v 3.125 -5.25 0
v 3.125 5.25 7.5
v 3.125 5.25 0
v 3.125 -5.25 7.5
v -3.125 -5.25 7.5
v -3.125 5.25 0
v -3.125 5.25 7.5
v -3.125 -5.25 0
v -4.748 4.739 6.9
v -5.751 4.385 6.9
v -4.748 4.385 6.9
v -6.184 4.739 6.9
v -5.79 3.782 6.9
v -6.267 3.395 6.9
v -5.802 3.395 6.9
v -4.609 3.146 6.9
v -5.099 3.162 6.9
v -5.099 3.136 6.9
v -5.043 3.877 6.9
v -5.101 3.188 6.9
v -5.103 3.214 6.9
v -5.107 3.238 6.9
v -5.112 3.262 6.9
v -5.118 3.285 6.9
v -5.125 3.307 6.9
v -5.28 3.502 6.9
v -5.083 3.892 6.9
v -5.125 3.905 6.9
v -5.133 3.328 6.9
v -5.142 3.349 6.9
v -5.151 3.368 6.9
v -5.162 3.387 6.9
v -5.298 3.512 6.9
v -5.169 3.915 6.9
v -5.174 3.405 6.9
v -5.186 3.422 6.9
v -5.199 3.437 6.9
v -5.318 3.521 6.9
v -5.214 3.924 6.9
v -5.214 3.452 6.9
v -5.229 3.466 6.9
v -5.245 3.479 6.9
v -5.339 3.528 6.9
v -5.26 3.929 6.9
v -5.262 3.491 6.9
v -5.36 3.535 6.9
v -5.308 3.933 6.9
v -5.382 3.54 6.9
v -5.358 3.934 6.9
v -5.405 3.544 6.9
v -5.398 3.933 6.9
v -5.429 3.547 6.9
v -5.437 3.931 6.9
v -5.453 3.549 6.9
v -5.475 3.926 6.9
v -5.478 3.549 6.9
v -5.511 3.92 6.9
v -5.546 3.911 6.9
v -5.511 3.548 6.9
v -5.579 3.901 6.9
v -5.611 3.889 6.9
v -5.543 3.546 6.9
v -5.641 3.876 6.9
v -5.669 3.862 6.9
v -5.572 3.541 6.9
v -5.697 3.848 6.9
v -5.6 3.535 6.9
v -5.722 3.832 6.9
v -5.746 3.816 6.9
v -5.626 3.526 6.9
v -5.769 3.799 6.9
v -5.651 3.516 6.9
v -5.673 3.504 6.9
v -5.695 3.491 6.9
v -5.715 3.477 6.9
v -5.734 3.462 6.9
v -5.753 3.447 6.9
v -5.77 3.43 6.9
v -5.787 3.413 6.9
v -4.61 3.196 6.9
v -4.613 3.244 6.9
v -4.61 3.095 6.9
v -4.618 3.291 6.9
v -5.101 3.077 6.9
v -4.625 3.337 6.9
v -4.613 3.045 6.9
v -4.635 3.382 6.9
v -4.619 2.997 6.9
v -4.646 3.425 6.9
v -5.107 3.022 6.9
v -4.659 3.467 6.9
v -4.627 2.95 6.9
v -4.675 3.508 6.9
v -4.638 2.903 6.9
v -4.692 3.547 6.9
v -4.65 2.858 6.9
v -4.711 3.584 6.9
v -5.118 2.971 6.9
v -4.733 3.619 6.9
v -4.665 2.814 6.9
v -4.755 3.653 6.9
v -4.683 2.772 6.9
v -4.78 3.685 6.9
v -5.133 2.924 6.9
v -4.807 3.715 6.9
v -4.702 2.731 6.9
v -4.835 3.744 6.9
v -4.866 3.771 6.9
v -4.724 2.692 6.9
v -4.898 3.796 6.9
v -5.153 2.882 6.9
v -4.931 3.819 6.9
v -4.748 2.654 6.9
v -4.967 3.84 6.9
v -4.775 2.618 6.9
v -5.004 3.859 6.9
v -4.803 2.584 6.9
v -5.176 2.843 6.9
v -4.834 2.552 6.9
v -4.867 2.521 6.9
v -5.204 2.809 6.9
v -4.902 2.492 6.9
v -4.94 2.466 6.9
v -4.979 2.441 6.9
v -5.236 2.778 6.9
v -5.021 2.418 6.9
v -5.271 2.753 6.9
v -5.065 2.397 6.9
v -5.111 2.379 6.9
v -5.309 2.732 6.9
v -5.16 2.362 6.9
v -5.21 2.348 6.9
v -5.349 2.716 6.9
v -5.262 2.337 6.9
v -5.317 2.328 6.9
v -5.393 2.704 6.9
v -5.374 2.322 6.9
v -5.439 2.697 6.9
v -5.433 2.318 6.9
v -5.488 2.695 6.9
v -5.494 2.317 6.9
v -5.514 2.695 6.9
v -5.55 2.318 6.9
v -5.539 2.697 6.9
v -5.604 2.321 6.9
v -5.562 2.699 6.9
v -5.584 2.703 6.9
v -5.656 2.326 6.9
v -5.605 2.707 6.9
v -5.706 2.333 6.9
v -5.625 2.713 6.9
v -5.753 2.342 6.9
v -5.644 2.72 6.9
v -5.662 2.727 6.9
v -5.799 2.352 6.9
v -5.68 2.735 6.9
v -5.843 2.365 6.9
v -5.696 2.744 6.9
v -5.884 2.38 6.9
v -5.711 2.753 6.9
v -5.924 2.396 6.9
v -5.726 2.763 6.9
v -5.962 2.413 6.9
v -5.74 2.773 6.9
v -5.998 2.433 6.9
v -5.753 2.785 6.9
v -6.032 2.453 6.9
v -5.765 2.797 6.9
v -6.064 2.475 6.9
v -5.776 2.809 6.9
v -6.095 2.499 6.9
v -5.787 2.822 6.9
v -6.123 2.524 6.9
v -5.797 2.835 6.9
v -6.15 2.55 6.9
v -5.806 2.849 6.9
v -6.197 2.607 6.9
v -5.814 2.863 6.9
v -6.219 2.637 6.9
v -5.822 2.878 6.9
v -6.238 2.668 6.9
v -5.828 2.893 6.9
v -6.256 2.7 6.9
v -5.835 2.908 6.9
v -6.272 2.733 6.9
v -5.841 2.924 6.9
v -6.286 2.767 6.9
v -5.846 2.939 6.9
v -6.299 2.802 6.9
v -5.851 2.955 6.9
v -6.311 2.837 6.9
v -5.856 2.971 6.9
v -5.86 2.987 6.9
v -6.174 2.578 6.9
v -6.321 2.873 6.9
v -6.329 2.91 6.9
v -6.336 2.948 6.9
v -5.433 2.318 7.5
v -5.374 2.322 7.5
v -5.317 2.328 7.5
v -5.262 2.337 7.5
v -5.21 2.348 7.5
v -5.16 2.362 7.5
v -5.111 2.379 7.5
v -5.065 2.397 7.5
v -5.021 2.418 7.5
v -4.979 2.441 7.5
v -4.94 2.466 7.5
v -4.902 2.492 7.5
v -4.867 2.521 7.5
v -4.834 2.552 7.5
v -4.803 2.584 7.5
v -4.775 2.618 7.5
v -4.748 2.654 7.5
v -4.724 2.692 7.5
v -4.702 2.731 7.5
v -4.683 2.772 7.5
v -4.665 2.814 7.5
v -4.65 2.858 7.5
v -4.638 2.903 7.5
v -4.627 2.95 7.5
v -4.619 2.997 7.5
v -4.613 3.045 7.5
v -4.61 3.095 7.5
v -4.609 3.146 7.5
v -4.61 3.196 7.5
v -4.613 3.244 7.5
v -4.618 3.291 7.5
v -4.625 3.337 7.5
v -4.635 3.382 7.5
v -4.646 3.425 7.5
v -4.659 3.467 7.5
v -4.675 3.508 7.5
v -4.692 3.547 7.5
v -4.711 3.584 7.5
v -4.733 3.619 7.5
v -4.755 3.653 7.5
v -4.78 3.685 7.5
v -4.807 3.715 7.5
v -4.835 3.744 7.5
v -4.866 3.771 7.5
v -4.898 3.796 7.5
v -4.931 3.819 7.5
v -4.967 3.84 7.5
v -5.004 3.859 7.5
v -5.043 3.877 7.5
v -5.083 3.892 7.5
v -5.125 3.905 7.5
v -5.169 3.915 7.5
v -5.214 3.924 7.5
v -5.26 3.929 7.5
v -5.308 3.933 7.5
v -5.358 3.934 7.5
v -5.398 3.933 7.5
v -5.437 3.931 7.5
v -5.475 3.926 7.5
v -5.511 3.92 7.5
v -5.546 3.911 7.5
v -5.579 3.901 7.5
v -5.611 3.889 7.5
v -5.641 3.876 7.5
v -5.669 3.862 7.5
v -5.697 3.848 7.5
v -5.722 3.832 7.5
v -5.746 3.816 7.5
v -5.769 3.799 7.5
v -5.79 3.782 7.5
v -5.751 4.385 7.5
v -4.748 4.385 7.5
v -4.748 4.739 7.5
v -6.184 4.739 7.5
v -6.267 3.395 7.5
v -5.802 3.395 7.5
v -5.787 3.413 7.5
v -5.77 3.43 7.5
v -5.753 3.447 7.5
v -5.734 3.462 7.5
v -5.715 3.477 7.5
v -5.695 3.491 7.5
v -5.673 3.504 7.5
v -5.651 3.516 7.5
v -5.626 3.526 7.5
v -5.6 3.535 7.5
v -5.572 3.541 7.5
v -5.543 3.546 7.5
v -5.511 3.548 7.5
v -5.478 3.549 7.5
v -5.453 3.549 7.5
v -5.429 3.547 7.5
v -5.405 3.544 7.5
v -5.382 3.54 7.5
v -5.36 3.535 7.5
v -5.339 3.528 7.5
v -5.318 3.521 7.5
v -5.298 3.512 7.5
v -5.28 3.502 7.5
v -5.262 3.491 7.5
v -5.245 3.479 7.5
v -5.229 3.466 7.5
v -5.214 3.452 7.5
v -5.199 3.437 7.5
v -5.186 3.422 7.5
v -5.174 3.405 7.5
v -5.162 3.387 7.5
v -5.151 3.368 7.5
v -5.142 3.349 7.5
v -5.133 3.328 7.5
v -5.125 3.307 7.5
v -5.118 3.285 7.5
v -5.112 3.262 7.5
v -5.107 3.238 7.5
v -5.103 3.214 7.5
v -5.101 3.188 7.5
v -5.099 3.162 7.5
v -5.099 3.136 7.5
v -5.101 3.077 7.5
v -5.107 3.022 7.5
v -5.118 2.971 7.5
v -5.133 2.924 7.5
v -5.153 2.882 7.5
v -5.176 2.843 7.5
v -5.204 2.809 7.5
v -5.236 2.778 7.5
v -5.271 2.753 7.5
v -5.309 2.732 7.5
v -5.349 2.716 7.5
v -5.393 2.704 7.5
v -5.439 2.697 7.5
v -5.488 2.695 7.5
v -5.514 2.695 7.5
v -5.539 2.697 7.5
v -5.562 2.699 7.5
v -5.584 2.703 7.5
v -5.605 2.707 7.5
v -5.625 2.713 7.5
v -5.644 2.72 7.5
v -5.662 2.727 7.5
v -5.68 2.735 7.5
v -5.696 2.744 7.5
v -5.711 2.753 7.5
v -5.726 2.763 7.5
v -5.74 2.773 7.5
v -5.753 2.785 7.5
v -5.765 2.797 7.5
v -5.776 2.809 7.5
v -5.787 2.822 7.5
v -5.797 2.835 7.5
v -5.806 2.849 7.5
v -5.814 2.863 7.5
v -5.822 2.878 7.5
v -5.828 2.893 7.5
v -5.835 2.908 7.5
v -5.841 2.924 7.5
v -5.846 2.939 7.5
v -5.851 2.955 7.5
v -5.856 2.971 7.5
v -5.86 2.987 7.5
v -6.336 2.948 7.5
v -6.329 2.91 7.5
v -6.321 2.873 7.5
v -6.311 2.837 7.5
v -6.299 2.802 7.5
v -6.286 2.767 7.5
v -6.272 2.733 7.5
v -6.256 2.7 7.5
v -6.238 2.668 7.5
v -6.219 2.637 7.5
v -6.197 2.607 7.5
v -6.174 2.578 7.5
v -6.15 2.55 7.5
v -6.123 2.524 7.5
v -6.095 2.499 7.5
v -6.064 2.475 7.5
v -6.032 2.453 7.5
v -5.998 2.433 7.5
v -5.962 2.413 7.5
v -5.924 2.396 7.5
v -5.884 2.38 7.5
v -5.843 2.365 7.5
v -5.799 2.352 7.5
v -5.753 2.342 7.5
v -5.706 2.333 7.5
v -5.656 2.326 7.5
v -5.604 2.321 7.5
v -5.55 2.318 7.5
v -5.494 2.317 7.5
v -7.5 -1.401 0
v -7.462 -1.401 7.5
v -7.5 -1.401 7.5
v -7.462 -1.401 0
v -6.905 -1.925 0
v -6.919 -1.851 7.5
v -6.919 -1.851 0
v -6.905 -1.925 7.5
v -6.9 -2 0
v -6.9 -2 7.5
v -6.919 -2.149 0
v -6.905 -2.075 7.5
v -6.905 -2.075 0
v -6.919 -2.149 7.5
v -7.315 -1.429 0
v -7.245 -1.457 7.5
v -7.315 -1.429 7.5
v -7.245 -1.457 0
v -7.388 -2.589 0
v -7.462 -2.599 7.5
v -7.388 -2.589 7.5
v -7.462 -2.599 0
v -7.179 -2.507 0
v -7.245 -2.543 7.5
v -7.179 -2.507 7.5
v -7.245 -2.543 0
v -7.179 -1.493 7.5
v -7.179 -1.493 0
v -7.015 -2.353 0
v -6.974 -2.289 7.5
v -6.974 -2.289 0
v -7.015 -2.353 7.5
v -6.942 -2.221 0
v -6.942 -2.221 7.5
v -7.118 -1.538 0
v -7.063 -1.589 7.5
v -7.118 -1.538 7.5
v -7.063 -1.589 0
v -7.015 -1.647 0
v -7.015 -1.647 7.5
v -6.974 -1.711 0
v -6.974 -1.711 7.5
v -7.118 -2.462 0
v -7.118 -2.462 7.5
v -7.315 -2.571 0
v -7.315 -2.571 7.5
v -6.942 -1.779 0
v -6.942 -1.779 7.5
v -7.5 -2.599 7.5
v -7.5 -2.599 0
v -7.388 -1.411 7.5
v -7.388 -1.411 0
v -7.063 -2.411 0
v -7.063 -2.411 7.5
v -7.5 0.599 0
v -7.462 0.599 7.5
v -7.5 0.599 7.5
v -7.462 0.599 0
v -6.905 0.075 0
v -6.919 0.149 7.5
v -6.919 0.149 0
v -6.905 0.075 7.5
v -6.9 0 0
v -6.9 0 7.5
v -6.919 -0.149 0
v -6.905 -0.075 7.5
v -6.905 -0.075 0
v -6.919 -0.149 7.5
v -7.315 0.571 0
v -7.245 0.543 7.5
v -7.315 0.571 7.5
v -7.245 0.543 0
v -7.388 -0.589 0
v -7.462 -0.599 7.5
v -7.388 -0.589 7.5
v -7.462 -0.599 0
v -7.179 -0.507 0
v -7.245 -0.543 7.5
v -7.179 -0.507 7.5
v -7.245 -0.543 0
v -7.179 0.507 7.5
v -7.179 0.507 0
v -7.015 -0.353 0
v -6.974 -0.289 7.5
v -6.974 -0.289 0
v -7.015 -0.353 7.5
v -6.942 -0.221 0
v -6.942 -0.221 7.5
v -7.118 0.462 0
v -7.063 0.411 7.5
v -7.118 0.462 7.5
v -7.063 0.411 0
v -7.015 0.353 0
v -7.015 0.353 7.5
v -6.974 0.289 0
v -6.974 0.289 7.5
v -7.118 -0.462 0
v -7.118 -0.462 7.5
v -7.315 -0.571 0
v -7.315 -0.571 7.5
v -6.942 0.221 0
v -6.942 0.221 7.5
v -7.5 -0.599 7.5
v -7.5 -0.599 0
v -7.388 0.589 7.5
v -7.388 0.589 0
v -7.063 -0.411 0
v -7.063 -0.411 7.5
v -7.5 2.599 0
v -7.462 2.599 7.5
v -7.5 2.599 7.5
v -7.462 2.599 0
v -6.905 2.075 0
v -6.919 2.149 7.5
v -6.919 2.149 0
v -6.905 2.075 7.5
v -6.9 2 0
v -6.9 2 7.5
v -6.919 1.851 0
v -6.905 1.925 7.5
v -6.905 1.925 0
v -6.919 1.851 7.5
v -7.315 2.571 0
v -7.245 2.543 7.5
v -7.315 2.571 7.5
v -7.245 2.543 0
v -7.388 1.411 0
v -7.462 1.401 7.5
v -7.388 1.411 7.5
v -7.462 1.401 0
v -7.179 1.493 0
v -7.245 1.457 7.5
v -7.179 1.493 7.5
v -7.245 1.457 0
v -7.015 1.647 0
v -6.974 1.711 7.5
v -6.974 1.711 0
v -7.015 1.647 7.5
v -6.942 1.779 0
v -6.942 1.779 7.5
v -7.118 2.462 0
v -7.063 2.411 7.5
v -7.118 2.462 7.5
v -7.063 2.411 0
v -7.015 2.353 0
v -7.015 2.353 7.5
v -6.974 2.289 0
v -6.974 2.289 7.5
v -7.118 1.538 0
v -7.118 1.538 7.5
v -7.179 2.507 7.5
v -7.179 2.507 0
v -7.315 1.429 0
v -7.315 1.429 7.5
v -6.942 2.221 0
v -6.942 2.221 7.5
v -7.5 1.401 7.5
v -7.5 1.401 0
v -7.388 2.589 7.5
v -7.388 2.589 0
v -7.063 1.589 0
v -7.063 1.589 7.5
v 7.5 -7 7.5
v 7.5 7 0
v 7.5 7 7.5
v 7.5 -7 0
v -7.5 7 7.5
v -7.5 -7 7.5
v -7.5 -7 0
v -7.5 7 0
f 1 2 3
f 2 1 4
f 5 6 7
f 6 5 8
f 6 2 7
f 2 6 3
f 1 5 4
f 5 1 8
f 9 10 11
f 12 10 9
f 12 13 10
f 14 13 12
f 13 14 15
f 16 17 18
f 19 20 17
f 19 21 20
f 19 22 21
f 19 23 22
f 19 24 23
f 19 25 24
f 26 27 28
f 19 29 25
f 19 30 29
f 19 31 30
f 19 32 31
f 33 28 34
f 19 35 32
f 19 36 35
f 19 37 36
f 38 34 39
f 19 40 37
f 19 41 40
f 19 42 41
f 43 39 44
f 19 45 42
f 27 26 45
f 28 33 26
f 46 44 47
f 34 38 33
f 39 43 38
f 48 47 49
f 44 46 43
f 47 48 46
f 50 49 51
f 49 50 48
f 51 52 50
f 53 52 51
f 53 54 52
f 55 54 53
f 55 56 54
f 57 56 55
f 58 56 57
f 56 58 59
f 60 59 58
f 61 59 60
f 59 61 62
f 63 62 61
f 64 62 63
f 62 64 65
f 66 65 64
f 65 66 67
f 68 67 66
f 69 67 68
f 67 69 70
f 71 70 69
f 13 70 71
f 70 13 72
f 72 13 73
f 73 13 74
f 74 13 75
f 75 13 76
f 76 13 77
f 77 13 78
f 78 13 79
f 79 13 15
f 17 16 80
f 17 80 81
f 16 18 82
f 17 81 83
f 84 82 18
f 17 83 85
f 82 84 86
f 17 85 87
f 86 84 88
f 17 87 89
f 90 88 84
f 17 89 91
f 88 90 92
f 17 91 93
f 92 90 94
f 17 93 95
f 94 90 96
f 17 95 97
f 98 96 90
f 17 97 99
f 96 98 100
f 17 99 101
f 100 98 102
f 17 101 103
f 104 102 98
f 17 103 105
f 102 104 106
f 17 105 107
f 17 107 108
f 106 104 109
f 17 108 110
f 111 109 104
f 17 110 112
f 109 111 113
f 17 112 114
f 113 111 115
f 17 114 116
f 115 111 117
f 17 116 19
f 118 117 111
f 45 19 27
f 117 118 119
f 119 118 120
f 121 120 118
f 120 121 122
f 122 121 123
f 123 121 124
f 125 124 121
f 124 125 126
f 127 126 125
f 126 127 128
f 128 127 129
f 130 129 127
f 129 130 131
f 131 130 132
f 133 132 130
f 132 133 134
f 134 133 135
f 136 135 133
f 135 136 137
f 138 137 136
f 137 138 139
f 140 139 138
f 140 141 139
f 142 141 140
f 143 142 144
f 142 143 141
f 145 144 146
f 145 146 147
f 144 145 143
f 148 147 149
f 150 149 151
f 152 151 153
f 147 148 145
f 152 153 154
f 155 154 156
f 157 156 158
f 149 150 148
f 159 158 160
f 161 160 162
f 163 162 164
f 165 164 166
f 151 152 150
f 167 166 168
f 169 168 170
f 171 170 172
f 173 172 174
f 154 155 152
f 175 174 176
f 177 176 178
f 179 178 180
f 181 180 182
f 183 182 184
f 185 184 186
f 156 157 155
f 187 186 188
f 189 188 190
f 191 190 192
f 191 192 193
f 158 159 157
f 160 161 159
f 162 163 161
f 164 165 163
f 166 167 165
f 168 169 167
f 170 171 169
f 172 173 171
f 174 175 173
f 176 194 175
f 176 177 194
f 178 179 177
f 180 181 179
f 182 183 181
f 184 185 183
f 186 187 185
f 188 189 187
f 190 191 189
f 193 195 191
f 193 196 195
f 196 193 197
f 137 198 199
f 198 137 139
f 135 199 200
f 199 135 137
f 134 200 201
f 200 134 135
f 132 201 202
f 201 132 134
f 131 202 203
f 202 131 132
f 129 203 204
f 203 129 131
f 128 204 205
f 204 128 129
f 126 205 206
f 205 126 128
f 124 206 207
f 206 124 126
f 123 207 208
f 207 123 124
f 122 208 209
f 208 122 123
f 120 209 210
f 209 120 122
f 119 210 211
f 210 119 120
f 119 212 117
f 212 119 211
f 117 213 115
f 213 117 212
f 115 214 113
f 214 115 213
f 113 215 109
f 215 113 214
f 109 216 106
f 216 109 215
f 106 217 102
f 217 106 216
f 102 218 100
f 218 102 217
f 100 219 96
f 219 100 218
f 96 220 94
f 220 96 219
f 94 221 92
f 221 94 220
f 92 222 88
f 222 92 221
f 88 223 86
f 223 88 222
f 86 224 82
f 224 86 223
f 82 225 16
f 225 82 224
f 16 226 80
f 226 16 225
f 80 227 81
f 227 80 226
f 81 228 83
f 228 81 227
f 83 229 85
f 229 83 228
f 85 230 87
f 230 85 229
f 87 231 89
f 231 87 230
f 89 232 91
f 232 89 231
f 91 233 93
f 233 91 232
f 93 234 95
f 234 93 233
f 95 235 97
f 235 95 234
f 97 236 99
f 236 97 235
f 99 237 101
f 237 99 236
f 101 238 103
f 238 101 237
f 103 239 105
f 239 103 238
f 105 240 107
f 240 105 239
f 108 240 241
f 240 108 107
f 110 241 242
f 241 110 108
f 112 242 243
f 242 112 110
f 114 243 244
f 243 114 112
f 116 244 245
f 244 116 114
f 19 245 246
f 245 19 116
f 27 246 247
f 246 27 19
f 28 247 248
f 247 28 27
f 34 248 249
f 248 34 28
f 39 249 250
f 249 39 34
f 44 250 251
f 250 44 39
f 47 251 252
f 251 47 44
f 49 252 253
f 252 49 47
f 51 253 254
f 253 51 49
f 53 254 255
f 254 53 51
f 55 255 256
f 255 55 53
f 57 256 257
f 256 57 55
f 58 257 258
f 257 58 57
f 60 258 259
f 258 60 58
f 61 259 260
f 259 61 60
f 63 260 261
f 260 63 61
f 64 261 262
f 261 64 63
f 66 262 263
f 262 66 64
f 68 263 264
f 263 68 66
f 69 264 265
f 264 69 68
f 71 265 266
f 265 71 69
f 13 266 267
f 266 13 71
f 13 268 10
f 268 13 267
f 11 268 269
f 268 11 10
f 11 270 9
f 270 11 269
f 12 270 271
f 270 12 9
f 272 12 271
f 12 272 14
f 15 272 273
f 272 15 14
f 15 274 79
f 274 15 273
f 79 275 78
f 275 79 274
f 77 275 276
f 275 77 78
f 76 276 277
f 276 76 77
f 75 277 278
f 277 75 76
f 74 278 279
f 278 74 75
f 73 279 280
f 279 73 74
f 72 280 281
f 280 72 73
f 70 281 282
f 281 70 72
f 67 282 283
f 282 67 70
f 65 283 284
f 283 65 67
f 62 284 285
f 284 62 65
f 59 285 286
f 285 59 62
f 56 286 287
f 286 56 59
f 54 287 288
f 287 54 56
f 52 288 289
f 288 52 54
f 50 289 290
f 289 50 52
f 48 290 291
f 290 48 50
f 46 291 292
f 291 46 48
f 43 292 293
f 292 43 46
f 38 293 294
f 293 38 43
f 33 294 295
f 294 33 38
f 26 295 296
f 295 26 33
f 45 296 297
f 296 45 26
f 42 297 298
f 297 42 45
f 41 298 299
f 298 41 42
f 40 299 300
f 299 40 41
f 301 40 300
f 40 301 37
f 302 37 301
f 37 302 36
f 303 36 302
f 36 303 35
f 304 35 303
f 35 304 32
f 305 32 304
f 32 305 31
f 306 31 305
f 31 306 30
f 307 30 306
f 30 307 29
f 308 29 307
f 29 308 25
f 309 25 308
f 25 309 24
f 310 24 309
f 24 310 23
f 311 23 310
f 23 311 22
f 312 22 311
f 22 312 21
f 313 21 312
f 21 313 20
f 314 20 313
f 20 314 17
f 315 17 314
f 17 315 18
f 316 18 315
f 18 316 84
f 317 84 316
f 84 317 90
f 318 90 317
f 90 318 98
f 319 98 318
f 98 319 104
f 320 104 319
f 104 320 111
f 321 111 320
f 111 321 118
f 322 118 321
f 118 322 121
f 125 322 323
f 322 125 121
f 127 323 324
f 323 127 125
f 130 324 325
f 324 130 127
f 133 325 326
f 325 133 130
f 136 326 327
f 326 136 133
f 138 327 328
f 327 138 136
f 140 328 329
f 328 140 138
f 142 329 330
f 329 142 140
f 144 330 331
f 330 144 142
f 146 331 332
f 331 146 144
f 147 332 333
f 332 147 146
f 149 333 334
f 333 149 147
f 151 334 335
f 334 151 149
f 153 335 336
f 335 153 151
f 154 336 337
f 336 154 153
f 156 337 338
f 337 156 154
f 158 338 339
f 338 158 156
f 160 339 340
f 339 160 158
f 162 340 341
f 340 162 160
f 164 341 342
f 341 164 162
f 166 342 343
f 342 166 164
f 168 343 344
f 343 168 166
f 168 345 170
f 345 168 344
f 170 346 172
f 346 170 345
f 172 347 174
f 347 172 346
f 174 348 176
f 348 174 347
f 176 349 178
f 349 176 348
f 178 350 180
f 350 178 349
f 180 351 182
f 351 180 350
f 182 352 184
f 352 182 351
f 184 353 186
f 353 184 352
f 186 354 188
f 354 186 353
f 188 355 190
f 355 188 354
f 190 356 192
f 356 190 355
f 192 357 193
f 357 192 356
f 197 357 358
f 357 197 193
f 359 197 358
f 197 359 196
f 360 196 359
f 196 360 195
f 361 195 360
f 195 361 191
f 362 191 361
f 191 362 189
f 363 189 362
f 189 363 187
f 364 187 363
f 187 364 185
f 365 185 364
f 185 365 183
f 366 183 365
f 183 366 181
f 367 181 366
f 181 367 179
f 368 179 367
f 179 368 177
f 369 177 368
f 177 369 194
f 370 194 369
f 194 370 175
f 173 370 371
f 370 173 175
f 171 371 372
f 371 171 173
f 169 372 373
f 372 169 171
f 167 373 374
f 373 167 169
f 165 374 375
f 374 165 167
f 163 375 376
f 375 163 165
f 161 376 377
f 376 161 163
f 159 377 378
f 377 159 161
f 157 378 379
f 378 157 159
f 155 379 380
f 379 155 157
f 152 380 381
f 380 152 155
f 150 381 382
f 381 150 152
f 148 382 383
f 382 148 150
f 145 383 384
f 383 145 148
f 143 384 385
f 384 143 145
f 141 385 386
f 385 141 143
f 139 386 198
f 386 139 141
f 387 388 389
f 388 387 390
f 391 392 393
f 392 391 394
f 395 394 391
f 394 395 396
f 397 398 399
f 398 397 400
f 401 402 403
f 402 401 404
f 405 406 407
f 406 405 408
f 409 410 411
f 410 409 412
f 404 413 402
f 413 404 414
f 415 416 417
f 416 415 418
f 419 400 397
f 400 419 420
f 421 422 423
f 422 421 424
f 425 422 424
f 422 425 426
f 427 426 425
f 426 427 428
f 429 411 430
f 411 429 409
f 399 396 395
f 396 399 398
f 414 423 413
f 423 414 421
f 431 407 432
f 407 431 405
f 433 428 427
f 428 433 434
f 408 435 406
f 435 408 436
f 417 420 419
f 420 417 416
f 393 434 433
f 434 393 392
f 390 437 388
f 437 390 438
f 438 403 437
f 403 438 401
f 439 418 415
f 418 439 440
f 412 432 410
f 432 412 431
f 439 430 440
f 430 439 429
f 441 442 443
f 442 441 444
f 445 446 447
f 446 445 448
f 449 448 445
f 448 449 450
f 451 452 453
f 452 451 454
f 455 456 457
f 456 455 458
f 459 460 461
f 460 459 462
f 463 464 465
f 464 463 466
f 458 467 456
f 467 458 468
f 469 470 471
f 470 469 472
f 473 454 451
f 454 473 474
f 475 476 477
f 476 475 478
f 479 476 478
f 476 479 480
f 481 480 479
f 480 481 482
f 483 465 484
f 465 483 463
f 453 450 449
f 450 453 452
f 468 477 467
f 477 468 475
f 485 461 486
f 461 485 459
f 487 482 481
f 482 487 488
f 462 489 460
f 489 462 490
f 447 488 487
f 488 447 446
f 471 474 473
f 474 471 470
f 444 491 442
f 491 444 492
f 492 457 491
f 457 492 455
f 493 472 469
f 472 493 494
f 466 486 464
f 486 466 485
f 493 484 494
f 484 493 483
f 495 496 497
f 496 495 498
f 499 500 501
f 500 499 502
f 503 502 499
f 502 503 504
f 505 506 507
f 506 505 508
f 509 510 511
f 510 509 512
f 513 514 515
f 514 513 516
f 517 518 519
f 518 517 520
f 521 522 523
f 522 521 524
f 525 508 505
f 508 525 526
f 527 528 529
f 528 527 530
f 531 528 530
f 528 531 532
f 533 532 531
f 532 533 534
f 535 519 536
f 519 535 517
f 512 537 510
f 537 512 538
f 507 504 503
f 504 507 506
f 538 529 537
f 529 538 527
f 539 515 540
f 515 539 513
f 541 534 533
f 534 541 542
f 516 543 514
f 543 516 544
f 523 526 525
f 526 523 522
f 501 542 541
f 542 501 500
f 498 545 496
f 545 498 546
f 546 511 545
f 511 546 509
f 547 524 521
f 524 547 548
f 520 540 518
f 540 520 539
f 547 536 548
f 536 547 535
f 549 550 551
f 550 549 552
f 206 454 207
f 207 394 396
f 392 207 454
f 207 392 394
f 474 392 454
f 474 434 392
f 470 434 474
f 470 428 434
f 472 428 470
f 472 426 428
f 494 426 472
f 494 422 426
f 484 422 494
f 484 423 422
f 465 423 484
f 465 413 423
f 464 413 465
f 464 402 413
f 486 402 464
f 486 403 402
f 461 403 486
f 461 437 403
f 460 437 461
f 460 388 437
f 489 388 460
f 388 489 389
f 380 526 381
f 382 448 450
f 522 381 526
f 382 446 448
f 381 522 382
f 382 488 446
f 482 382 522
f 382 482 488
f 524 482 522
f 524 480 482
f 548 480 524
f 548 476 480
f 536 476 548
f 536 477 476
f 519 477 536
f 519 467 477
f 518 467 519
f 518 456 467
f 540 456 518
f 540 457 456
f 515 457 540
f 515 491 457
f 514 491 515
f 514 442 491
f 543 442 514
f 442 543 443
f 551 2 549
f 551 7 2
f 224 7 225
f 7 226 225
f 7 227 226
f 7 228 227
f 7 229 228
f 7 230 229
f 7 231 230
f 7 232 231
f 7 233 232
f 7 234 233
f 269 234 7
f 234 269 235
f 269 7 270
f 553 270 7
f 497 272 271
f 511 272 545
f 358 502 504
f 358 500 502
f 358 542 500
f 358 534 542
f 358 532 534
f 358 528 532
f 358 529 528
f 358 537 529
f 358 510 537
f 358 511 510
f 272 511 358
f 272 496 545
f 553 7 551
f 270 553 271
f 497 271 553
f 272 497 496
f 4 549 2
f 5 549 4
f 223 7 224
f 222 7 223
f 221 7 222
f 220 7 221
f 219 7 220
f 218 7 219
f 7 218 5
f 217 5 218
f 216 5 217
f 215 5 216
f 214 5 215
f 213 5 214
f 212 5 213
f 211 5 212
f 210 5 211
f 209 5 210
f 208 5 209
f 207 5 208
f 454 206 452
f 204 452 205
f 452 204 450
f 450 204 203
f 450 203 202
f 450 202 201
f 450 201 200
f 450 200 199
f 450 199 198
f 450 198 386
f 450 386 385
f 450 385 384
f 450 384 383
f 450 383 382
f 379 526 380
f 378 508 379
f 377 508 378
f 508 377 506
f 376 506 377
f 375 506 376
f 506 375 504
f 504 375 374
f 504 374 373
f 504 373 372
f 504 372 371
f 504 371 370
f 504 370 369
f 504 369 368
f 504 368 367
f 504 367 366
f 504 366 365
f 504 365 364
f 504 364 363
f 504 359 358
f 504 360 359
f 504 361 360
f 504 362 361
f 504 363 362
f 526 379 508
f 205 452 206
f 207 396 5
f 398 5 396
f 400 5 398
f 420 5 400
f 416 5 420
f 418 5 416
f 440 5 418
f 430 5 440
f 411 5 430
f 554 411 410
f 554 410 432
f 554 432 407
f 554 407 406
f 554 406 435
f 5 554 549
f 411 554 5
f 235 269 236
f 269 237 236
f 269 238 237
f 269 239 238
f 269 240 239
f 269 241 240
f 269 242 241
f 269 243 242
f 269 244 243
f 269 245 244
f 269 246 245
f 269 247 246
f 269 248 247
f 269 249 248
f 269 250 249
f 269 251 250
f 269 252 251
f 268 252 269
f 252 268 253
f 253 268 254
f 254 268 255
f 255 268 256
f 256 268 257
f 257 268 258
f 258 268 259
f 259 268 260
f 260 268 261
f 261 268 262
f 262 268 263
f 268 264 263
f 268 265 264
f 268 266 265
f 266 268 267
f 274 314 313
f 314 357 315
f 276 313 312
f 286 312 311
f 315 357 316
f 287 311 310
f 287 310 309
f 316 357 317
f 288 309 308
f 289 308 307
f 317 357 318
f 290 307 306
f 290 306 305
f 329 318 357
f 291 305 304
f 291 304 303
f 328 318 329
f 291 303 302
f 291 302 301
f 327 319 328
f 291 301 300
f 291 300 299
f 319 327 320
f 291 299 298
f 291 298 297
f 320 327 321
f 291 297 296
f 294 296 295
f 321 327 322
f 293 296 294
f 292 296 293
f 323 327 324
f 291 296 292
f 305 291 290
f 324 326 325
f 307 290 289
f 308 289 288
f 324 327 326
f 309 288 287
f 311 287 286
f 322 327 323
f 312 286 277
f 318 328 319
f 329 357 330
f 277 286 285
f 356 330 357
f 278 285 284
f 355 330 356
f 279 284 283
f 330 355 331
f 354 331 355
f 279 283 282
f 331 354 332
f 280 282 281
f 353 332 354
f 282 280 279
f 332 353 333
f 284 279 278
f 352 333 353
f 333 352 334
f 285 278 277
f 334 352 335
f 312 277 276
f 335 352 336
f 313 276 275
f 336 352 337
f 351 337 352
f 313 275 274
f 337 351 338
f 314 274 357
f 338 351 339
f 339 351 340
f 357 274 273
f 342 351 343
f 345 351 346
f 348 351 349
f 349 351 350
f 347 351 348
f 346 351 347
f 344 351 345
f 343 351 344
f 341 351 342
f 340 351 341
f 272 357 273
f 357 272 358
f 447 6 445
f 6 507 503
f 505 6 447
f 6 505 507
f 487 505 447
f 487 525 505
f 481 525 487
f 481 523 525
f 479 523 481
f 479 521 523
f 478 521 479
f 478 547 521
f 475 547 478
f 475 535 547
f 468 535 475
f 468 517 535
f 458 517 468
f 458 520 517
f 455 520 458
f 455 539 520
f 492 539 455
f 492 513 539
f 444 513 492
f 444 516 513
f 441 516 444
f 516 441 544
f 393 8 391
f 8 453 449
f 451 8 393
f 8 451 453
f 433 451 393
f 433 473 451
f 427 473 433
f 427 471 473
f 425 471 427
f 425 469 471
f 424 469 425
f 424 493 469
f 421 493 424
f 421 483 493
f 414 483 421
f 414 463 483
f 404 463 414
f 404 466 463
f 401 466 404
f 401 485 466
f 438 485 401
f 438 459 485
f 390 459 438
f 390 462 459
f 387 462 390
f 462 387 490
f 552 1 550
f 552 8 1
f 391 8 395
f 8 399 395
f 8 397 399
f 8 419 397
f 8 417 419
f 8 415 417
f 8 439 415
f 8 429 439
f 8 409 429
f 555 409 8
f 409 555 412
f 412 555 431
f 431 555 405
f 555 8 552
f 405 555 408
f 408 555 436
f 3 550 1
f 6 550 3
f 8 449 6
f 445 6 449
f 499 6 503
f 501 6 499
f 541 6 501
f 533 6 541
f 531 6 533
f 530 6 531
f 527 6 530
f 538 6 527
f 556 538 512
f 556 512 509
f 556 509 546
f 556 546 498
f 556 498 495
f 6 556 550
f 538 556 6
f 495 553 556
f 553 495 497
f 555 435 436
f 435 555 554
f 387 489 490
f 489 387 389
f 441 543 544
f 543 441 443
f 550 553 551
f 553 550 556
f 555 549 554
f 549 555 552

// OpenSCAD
$fn = 50;

difference() {
	union() {
		translate(v = [0, -5, 0]) {
			rotate(a = [0, 0, 0]) {
				difference() {
					union() {
						translate(v = [-7.5, -2.0, 0]) {
							cube(size = [15.0, 14.0, 7.5]);
						}
					}
					union() {
						translate(v = [-3.125, -0.25, -0.1]) {
							cube(size = [6.25, 10.5, 7.7]);
						}
						translate(v = [-5.5, 8.5, 6.9]) {
							linear_extrude(height = 0.7) {
								text(font = "Arial:style=Bold", halign = "center", size = 2.5, text = "5", valign = "center");
							}
						}
						translate(v = [-7.5, 3, -0.1]) {
							cylinder(h = 7.7, r = 0.6);
						}
						translate(v = [-7.5, 5, -0.1]) {
							cylinder(h = 7.7, r = 0.6);
						}
						translate(v = [-7.5, 7, -0.1]) {
							cylinder(h = 7.7, r = 0.6);
						}
					}
				}
			}
		}
	}
	union();
}
